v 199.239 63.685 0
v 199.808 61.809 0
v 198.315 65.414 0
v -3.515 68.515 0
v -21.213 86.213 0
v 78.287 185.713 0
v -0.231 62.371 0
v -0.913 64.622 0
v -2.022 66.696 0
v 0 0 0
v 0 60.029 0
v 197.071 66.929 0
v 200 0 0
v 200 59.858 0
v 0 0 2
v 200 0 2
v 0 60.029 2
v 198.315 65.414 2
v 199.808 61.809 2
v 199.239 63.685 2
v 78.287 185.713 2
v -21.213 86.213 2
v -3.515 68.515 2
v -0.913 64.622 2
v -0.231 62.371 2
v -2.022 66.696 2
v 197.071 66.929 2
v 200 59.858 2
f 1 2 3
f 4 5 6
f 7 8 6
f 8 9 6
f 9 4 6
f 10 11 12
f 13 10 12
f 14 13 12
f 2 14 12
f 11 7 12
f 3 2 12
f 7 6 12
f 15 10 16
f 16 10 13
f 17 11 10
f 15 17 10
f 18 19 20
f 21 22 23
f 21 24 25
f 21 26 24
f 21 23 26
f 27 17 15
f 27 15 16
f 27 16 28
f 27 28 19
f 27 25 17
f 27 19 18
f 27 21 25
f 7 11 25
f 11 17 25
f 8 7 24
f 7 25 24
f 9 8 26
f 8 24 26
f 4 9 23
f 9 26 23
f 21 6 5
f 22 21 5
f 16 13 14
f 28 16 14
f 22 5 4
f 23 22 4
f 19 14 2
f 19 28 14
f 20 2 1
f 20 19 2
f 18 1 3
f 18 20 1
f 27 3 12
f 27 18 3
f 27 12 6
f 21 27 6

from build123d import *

# Parameters (mm, degrees)
EXTRUDE_2_DEPTH = 2
FILLET_1_R      = 10
FILLET_2_R      = 12


with BuildPart() as part:
    # Эскиз2 → Бобышка-Вытянуть2 (new body)
    with BuildSketch(Plane.XY):
        Polygon((0, 0), (200, 0), (200, 64), (78.286796564, 185.713203436), (-21.213203436, 86.213203436), (0, 65), align=None)
    extrude(amount=EXTRUDE_2_DEPTH)

    # Скругление1
    fillet_1_edges = [part.edges().sort_by_distance(p)[0] for p in [
        (200, 64, 1),
    ]]
    fillet(fillet_1_edges, radius=FILLET_1_R)

    # Скругление2
    fillet_2_edges = [part.edges().sort_by_distance(p)[0] for p in [
        (0, 65, 1),
    ]]
    fillet(fillet_2_edges, radius=FILLET_2_R)


solid = part.part
